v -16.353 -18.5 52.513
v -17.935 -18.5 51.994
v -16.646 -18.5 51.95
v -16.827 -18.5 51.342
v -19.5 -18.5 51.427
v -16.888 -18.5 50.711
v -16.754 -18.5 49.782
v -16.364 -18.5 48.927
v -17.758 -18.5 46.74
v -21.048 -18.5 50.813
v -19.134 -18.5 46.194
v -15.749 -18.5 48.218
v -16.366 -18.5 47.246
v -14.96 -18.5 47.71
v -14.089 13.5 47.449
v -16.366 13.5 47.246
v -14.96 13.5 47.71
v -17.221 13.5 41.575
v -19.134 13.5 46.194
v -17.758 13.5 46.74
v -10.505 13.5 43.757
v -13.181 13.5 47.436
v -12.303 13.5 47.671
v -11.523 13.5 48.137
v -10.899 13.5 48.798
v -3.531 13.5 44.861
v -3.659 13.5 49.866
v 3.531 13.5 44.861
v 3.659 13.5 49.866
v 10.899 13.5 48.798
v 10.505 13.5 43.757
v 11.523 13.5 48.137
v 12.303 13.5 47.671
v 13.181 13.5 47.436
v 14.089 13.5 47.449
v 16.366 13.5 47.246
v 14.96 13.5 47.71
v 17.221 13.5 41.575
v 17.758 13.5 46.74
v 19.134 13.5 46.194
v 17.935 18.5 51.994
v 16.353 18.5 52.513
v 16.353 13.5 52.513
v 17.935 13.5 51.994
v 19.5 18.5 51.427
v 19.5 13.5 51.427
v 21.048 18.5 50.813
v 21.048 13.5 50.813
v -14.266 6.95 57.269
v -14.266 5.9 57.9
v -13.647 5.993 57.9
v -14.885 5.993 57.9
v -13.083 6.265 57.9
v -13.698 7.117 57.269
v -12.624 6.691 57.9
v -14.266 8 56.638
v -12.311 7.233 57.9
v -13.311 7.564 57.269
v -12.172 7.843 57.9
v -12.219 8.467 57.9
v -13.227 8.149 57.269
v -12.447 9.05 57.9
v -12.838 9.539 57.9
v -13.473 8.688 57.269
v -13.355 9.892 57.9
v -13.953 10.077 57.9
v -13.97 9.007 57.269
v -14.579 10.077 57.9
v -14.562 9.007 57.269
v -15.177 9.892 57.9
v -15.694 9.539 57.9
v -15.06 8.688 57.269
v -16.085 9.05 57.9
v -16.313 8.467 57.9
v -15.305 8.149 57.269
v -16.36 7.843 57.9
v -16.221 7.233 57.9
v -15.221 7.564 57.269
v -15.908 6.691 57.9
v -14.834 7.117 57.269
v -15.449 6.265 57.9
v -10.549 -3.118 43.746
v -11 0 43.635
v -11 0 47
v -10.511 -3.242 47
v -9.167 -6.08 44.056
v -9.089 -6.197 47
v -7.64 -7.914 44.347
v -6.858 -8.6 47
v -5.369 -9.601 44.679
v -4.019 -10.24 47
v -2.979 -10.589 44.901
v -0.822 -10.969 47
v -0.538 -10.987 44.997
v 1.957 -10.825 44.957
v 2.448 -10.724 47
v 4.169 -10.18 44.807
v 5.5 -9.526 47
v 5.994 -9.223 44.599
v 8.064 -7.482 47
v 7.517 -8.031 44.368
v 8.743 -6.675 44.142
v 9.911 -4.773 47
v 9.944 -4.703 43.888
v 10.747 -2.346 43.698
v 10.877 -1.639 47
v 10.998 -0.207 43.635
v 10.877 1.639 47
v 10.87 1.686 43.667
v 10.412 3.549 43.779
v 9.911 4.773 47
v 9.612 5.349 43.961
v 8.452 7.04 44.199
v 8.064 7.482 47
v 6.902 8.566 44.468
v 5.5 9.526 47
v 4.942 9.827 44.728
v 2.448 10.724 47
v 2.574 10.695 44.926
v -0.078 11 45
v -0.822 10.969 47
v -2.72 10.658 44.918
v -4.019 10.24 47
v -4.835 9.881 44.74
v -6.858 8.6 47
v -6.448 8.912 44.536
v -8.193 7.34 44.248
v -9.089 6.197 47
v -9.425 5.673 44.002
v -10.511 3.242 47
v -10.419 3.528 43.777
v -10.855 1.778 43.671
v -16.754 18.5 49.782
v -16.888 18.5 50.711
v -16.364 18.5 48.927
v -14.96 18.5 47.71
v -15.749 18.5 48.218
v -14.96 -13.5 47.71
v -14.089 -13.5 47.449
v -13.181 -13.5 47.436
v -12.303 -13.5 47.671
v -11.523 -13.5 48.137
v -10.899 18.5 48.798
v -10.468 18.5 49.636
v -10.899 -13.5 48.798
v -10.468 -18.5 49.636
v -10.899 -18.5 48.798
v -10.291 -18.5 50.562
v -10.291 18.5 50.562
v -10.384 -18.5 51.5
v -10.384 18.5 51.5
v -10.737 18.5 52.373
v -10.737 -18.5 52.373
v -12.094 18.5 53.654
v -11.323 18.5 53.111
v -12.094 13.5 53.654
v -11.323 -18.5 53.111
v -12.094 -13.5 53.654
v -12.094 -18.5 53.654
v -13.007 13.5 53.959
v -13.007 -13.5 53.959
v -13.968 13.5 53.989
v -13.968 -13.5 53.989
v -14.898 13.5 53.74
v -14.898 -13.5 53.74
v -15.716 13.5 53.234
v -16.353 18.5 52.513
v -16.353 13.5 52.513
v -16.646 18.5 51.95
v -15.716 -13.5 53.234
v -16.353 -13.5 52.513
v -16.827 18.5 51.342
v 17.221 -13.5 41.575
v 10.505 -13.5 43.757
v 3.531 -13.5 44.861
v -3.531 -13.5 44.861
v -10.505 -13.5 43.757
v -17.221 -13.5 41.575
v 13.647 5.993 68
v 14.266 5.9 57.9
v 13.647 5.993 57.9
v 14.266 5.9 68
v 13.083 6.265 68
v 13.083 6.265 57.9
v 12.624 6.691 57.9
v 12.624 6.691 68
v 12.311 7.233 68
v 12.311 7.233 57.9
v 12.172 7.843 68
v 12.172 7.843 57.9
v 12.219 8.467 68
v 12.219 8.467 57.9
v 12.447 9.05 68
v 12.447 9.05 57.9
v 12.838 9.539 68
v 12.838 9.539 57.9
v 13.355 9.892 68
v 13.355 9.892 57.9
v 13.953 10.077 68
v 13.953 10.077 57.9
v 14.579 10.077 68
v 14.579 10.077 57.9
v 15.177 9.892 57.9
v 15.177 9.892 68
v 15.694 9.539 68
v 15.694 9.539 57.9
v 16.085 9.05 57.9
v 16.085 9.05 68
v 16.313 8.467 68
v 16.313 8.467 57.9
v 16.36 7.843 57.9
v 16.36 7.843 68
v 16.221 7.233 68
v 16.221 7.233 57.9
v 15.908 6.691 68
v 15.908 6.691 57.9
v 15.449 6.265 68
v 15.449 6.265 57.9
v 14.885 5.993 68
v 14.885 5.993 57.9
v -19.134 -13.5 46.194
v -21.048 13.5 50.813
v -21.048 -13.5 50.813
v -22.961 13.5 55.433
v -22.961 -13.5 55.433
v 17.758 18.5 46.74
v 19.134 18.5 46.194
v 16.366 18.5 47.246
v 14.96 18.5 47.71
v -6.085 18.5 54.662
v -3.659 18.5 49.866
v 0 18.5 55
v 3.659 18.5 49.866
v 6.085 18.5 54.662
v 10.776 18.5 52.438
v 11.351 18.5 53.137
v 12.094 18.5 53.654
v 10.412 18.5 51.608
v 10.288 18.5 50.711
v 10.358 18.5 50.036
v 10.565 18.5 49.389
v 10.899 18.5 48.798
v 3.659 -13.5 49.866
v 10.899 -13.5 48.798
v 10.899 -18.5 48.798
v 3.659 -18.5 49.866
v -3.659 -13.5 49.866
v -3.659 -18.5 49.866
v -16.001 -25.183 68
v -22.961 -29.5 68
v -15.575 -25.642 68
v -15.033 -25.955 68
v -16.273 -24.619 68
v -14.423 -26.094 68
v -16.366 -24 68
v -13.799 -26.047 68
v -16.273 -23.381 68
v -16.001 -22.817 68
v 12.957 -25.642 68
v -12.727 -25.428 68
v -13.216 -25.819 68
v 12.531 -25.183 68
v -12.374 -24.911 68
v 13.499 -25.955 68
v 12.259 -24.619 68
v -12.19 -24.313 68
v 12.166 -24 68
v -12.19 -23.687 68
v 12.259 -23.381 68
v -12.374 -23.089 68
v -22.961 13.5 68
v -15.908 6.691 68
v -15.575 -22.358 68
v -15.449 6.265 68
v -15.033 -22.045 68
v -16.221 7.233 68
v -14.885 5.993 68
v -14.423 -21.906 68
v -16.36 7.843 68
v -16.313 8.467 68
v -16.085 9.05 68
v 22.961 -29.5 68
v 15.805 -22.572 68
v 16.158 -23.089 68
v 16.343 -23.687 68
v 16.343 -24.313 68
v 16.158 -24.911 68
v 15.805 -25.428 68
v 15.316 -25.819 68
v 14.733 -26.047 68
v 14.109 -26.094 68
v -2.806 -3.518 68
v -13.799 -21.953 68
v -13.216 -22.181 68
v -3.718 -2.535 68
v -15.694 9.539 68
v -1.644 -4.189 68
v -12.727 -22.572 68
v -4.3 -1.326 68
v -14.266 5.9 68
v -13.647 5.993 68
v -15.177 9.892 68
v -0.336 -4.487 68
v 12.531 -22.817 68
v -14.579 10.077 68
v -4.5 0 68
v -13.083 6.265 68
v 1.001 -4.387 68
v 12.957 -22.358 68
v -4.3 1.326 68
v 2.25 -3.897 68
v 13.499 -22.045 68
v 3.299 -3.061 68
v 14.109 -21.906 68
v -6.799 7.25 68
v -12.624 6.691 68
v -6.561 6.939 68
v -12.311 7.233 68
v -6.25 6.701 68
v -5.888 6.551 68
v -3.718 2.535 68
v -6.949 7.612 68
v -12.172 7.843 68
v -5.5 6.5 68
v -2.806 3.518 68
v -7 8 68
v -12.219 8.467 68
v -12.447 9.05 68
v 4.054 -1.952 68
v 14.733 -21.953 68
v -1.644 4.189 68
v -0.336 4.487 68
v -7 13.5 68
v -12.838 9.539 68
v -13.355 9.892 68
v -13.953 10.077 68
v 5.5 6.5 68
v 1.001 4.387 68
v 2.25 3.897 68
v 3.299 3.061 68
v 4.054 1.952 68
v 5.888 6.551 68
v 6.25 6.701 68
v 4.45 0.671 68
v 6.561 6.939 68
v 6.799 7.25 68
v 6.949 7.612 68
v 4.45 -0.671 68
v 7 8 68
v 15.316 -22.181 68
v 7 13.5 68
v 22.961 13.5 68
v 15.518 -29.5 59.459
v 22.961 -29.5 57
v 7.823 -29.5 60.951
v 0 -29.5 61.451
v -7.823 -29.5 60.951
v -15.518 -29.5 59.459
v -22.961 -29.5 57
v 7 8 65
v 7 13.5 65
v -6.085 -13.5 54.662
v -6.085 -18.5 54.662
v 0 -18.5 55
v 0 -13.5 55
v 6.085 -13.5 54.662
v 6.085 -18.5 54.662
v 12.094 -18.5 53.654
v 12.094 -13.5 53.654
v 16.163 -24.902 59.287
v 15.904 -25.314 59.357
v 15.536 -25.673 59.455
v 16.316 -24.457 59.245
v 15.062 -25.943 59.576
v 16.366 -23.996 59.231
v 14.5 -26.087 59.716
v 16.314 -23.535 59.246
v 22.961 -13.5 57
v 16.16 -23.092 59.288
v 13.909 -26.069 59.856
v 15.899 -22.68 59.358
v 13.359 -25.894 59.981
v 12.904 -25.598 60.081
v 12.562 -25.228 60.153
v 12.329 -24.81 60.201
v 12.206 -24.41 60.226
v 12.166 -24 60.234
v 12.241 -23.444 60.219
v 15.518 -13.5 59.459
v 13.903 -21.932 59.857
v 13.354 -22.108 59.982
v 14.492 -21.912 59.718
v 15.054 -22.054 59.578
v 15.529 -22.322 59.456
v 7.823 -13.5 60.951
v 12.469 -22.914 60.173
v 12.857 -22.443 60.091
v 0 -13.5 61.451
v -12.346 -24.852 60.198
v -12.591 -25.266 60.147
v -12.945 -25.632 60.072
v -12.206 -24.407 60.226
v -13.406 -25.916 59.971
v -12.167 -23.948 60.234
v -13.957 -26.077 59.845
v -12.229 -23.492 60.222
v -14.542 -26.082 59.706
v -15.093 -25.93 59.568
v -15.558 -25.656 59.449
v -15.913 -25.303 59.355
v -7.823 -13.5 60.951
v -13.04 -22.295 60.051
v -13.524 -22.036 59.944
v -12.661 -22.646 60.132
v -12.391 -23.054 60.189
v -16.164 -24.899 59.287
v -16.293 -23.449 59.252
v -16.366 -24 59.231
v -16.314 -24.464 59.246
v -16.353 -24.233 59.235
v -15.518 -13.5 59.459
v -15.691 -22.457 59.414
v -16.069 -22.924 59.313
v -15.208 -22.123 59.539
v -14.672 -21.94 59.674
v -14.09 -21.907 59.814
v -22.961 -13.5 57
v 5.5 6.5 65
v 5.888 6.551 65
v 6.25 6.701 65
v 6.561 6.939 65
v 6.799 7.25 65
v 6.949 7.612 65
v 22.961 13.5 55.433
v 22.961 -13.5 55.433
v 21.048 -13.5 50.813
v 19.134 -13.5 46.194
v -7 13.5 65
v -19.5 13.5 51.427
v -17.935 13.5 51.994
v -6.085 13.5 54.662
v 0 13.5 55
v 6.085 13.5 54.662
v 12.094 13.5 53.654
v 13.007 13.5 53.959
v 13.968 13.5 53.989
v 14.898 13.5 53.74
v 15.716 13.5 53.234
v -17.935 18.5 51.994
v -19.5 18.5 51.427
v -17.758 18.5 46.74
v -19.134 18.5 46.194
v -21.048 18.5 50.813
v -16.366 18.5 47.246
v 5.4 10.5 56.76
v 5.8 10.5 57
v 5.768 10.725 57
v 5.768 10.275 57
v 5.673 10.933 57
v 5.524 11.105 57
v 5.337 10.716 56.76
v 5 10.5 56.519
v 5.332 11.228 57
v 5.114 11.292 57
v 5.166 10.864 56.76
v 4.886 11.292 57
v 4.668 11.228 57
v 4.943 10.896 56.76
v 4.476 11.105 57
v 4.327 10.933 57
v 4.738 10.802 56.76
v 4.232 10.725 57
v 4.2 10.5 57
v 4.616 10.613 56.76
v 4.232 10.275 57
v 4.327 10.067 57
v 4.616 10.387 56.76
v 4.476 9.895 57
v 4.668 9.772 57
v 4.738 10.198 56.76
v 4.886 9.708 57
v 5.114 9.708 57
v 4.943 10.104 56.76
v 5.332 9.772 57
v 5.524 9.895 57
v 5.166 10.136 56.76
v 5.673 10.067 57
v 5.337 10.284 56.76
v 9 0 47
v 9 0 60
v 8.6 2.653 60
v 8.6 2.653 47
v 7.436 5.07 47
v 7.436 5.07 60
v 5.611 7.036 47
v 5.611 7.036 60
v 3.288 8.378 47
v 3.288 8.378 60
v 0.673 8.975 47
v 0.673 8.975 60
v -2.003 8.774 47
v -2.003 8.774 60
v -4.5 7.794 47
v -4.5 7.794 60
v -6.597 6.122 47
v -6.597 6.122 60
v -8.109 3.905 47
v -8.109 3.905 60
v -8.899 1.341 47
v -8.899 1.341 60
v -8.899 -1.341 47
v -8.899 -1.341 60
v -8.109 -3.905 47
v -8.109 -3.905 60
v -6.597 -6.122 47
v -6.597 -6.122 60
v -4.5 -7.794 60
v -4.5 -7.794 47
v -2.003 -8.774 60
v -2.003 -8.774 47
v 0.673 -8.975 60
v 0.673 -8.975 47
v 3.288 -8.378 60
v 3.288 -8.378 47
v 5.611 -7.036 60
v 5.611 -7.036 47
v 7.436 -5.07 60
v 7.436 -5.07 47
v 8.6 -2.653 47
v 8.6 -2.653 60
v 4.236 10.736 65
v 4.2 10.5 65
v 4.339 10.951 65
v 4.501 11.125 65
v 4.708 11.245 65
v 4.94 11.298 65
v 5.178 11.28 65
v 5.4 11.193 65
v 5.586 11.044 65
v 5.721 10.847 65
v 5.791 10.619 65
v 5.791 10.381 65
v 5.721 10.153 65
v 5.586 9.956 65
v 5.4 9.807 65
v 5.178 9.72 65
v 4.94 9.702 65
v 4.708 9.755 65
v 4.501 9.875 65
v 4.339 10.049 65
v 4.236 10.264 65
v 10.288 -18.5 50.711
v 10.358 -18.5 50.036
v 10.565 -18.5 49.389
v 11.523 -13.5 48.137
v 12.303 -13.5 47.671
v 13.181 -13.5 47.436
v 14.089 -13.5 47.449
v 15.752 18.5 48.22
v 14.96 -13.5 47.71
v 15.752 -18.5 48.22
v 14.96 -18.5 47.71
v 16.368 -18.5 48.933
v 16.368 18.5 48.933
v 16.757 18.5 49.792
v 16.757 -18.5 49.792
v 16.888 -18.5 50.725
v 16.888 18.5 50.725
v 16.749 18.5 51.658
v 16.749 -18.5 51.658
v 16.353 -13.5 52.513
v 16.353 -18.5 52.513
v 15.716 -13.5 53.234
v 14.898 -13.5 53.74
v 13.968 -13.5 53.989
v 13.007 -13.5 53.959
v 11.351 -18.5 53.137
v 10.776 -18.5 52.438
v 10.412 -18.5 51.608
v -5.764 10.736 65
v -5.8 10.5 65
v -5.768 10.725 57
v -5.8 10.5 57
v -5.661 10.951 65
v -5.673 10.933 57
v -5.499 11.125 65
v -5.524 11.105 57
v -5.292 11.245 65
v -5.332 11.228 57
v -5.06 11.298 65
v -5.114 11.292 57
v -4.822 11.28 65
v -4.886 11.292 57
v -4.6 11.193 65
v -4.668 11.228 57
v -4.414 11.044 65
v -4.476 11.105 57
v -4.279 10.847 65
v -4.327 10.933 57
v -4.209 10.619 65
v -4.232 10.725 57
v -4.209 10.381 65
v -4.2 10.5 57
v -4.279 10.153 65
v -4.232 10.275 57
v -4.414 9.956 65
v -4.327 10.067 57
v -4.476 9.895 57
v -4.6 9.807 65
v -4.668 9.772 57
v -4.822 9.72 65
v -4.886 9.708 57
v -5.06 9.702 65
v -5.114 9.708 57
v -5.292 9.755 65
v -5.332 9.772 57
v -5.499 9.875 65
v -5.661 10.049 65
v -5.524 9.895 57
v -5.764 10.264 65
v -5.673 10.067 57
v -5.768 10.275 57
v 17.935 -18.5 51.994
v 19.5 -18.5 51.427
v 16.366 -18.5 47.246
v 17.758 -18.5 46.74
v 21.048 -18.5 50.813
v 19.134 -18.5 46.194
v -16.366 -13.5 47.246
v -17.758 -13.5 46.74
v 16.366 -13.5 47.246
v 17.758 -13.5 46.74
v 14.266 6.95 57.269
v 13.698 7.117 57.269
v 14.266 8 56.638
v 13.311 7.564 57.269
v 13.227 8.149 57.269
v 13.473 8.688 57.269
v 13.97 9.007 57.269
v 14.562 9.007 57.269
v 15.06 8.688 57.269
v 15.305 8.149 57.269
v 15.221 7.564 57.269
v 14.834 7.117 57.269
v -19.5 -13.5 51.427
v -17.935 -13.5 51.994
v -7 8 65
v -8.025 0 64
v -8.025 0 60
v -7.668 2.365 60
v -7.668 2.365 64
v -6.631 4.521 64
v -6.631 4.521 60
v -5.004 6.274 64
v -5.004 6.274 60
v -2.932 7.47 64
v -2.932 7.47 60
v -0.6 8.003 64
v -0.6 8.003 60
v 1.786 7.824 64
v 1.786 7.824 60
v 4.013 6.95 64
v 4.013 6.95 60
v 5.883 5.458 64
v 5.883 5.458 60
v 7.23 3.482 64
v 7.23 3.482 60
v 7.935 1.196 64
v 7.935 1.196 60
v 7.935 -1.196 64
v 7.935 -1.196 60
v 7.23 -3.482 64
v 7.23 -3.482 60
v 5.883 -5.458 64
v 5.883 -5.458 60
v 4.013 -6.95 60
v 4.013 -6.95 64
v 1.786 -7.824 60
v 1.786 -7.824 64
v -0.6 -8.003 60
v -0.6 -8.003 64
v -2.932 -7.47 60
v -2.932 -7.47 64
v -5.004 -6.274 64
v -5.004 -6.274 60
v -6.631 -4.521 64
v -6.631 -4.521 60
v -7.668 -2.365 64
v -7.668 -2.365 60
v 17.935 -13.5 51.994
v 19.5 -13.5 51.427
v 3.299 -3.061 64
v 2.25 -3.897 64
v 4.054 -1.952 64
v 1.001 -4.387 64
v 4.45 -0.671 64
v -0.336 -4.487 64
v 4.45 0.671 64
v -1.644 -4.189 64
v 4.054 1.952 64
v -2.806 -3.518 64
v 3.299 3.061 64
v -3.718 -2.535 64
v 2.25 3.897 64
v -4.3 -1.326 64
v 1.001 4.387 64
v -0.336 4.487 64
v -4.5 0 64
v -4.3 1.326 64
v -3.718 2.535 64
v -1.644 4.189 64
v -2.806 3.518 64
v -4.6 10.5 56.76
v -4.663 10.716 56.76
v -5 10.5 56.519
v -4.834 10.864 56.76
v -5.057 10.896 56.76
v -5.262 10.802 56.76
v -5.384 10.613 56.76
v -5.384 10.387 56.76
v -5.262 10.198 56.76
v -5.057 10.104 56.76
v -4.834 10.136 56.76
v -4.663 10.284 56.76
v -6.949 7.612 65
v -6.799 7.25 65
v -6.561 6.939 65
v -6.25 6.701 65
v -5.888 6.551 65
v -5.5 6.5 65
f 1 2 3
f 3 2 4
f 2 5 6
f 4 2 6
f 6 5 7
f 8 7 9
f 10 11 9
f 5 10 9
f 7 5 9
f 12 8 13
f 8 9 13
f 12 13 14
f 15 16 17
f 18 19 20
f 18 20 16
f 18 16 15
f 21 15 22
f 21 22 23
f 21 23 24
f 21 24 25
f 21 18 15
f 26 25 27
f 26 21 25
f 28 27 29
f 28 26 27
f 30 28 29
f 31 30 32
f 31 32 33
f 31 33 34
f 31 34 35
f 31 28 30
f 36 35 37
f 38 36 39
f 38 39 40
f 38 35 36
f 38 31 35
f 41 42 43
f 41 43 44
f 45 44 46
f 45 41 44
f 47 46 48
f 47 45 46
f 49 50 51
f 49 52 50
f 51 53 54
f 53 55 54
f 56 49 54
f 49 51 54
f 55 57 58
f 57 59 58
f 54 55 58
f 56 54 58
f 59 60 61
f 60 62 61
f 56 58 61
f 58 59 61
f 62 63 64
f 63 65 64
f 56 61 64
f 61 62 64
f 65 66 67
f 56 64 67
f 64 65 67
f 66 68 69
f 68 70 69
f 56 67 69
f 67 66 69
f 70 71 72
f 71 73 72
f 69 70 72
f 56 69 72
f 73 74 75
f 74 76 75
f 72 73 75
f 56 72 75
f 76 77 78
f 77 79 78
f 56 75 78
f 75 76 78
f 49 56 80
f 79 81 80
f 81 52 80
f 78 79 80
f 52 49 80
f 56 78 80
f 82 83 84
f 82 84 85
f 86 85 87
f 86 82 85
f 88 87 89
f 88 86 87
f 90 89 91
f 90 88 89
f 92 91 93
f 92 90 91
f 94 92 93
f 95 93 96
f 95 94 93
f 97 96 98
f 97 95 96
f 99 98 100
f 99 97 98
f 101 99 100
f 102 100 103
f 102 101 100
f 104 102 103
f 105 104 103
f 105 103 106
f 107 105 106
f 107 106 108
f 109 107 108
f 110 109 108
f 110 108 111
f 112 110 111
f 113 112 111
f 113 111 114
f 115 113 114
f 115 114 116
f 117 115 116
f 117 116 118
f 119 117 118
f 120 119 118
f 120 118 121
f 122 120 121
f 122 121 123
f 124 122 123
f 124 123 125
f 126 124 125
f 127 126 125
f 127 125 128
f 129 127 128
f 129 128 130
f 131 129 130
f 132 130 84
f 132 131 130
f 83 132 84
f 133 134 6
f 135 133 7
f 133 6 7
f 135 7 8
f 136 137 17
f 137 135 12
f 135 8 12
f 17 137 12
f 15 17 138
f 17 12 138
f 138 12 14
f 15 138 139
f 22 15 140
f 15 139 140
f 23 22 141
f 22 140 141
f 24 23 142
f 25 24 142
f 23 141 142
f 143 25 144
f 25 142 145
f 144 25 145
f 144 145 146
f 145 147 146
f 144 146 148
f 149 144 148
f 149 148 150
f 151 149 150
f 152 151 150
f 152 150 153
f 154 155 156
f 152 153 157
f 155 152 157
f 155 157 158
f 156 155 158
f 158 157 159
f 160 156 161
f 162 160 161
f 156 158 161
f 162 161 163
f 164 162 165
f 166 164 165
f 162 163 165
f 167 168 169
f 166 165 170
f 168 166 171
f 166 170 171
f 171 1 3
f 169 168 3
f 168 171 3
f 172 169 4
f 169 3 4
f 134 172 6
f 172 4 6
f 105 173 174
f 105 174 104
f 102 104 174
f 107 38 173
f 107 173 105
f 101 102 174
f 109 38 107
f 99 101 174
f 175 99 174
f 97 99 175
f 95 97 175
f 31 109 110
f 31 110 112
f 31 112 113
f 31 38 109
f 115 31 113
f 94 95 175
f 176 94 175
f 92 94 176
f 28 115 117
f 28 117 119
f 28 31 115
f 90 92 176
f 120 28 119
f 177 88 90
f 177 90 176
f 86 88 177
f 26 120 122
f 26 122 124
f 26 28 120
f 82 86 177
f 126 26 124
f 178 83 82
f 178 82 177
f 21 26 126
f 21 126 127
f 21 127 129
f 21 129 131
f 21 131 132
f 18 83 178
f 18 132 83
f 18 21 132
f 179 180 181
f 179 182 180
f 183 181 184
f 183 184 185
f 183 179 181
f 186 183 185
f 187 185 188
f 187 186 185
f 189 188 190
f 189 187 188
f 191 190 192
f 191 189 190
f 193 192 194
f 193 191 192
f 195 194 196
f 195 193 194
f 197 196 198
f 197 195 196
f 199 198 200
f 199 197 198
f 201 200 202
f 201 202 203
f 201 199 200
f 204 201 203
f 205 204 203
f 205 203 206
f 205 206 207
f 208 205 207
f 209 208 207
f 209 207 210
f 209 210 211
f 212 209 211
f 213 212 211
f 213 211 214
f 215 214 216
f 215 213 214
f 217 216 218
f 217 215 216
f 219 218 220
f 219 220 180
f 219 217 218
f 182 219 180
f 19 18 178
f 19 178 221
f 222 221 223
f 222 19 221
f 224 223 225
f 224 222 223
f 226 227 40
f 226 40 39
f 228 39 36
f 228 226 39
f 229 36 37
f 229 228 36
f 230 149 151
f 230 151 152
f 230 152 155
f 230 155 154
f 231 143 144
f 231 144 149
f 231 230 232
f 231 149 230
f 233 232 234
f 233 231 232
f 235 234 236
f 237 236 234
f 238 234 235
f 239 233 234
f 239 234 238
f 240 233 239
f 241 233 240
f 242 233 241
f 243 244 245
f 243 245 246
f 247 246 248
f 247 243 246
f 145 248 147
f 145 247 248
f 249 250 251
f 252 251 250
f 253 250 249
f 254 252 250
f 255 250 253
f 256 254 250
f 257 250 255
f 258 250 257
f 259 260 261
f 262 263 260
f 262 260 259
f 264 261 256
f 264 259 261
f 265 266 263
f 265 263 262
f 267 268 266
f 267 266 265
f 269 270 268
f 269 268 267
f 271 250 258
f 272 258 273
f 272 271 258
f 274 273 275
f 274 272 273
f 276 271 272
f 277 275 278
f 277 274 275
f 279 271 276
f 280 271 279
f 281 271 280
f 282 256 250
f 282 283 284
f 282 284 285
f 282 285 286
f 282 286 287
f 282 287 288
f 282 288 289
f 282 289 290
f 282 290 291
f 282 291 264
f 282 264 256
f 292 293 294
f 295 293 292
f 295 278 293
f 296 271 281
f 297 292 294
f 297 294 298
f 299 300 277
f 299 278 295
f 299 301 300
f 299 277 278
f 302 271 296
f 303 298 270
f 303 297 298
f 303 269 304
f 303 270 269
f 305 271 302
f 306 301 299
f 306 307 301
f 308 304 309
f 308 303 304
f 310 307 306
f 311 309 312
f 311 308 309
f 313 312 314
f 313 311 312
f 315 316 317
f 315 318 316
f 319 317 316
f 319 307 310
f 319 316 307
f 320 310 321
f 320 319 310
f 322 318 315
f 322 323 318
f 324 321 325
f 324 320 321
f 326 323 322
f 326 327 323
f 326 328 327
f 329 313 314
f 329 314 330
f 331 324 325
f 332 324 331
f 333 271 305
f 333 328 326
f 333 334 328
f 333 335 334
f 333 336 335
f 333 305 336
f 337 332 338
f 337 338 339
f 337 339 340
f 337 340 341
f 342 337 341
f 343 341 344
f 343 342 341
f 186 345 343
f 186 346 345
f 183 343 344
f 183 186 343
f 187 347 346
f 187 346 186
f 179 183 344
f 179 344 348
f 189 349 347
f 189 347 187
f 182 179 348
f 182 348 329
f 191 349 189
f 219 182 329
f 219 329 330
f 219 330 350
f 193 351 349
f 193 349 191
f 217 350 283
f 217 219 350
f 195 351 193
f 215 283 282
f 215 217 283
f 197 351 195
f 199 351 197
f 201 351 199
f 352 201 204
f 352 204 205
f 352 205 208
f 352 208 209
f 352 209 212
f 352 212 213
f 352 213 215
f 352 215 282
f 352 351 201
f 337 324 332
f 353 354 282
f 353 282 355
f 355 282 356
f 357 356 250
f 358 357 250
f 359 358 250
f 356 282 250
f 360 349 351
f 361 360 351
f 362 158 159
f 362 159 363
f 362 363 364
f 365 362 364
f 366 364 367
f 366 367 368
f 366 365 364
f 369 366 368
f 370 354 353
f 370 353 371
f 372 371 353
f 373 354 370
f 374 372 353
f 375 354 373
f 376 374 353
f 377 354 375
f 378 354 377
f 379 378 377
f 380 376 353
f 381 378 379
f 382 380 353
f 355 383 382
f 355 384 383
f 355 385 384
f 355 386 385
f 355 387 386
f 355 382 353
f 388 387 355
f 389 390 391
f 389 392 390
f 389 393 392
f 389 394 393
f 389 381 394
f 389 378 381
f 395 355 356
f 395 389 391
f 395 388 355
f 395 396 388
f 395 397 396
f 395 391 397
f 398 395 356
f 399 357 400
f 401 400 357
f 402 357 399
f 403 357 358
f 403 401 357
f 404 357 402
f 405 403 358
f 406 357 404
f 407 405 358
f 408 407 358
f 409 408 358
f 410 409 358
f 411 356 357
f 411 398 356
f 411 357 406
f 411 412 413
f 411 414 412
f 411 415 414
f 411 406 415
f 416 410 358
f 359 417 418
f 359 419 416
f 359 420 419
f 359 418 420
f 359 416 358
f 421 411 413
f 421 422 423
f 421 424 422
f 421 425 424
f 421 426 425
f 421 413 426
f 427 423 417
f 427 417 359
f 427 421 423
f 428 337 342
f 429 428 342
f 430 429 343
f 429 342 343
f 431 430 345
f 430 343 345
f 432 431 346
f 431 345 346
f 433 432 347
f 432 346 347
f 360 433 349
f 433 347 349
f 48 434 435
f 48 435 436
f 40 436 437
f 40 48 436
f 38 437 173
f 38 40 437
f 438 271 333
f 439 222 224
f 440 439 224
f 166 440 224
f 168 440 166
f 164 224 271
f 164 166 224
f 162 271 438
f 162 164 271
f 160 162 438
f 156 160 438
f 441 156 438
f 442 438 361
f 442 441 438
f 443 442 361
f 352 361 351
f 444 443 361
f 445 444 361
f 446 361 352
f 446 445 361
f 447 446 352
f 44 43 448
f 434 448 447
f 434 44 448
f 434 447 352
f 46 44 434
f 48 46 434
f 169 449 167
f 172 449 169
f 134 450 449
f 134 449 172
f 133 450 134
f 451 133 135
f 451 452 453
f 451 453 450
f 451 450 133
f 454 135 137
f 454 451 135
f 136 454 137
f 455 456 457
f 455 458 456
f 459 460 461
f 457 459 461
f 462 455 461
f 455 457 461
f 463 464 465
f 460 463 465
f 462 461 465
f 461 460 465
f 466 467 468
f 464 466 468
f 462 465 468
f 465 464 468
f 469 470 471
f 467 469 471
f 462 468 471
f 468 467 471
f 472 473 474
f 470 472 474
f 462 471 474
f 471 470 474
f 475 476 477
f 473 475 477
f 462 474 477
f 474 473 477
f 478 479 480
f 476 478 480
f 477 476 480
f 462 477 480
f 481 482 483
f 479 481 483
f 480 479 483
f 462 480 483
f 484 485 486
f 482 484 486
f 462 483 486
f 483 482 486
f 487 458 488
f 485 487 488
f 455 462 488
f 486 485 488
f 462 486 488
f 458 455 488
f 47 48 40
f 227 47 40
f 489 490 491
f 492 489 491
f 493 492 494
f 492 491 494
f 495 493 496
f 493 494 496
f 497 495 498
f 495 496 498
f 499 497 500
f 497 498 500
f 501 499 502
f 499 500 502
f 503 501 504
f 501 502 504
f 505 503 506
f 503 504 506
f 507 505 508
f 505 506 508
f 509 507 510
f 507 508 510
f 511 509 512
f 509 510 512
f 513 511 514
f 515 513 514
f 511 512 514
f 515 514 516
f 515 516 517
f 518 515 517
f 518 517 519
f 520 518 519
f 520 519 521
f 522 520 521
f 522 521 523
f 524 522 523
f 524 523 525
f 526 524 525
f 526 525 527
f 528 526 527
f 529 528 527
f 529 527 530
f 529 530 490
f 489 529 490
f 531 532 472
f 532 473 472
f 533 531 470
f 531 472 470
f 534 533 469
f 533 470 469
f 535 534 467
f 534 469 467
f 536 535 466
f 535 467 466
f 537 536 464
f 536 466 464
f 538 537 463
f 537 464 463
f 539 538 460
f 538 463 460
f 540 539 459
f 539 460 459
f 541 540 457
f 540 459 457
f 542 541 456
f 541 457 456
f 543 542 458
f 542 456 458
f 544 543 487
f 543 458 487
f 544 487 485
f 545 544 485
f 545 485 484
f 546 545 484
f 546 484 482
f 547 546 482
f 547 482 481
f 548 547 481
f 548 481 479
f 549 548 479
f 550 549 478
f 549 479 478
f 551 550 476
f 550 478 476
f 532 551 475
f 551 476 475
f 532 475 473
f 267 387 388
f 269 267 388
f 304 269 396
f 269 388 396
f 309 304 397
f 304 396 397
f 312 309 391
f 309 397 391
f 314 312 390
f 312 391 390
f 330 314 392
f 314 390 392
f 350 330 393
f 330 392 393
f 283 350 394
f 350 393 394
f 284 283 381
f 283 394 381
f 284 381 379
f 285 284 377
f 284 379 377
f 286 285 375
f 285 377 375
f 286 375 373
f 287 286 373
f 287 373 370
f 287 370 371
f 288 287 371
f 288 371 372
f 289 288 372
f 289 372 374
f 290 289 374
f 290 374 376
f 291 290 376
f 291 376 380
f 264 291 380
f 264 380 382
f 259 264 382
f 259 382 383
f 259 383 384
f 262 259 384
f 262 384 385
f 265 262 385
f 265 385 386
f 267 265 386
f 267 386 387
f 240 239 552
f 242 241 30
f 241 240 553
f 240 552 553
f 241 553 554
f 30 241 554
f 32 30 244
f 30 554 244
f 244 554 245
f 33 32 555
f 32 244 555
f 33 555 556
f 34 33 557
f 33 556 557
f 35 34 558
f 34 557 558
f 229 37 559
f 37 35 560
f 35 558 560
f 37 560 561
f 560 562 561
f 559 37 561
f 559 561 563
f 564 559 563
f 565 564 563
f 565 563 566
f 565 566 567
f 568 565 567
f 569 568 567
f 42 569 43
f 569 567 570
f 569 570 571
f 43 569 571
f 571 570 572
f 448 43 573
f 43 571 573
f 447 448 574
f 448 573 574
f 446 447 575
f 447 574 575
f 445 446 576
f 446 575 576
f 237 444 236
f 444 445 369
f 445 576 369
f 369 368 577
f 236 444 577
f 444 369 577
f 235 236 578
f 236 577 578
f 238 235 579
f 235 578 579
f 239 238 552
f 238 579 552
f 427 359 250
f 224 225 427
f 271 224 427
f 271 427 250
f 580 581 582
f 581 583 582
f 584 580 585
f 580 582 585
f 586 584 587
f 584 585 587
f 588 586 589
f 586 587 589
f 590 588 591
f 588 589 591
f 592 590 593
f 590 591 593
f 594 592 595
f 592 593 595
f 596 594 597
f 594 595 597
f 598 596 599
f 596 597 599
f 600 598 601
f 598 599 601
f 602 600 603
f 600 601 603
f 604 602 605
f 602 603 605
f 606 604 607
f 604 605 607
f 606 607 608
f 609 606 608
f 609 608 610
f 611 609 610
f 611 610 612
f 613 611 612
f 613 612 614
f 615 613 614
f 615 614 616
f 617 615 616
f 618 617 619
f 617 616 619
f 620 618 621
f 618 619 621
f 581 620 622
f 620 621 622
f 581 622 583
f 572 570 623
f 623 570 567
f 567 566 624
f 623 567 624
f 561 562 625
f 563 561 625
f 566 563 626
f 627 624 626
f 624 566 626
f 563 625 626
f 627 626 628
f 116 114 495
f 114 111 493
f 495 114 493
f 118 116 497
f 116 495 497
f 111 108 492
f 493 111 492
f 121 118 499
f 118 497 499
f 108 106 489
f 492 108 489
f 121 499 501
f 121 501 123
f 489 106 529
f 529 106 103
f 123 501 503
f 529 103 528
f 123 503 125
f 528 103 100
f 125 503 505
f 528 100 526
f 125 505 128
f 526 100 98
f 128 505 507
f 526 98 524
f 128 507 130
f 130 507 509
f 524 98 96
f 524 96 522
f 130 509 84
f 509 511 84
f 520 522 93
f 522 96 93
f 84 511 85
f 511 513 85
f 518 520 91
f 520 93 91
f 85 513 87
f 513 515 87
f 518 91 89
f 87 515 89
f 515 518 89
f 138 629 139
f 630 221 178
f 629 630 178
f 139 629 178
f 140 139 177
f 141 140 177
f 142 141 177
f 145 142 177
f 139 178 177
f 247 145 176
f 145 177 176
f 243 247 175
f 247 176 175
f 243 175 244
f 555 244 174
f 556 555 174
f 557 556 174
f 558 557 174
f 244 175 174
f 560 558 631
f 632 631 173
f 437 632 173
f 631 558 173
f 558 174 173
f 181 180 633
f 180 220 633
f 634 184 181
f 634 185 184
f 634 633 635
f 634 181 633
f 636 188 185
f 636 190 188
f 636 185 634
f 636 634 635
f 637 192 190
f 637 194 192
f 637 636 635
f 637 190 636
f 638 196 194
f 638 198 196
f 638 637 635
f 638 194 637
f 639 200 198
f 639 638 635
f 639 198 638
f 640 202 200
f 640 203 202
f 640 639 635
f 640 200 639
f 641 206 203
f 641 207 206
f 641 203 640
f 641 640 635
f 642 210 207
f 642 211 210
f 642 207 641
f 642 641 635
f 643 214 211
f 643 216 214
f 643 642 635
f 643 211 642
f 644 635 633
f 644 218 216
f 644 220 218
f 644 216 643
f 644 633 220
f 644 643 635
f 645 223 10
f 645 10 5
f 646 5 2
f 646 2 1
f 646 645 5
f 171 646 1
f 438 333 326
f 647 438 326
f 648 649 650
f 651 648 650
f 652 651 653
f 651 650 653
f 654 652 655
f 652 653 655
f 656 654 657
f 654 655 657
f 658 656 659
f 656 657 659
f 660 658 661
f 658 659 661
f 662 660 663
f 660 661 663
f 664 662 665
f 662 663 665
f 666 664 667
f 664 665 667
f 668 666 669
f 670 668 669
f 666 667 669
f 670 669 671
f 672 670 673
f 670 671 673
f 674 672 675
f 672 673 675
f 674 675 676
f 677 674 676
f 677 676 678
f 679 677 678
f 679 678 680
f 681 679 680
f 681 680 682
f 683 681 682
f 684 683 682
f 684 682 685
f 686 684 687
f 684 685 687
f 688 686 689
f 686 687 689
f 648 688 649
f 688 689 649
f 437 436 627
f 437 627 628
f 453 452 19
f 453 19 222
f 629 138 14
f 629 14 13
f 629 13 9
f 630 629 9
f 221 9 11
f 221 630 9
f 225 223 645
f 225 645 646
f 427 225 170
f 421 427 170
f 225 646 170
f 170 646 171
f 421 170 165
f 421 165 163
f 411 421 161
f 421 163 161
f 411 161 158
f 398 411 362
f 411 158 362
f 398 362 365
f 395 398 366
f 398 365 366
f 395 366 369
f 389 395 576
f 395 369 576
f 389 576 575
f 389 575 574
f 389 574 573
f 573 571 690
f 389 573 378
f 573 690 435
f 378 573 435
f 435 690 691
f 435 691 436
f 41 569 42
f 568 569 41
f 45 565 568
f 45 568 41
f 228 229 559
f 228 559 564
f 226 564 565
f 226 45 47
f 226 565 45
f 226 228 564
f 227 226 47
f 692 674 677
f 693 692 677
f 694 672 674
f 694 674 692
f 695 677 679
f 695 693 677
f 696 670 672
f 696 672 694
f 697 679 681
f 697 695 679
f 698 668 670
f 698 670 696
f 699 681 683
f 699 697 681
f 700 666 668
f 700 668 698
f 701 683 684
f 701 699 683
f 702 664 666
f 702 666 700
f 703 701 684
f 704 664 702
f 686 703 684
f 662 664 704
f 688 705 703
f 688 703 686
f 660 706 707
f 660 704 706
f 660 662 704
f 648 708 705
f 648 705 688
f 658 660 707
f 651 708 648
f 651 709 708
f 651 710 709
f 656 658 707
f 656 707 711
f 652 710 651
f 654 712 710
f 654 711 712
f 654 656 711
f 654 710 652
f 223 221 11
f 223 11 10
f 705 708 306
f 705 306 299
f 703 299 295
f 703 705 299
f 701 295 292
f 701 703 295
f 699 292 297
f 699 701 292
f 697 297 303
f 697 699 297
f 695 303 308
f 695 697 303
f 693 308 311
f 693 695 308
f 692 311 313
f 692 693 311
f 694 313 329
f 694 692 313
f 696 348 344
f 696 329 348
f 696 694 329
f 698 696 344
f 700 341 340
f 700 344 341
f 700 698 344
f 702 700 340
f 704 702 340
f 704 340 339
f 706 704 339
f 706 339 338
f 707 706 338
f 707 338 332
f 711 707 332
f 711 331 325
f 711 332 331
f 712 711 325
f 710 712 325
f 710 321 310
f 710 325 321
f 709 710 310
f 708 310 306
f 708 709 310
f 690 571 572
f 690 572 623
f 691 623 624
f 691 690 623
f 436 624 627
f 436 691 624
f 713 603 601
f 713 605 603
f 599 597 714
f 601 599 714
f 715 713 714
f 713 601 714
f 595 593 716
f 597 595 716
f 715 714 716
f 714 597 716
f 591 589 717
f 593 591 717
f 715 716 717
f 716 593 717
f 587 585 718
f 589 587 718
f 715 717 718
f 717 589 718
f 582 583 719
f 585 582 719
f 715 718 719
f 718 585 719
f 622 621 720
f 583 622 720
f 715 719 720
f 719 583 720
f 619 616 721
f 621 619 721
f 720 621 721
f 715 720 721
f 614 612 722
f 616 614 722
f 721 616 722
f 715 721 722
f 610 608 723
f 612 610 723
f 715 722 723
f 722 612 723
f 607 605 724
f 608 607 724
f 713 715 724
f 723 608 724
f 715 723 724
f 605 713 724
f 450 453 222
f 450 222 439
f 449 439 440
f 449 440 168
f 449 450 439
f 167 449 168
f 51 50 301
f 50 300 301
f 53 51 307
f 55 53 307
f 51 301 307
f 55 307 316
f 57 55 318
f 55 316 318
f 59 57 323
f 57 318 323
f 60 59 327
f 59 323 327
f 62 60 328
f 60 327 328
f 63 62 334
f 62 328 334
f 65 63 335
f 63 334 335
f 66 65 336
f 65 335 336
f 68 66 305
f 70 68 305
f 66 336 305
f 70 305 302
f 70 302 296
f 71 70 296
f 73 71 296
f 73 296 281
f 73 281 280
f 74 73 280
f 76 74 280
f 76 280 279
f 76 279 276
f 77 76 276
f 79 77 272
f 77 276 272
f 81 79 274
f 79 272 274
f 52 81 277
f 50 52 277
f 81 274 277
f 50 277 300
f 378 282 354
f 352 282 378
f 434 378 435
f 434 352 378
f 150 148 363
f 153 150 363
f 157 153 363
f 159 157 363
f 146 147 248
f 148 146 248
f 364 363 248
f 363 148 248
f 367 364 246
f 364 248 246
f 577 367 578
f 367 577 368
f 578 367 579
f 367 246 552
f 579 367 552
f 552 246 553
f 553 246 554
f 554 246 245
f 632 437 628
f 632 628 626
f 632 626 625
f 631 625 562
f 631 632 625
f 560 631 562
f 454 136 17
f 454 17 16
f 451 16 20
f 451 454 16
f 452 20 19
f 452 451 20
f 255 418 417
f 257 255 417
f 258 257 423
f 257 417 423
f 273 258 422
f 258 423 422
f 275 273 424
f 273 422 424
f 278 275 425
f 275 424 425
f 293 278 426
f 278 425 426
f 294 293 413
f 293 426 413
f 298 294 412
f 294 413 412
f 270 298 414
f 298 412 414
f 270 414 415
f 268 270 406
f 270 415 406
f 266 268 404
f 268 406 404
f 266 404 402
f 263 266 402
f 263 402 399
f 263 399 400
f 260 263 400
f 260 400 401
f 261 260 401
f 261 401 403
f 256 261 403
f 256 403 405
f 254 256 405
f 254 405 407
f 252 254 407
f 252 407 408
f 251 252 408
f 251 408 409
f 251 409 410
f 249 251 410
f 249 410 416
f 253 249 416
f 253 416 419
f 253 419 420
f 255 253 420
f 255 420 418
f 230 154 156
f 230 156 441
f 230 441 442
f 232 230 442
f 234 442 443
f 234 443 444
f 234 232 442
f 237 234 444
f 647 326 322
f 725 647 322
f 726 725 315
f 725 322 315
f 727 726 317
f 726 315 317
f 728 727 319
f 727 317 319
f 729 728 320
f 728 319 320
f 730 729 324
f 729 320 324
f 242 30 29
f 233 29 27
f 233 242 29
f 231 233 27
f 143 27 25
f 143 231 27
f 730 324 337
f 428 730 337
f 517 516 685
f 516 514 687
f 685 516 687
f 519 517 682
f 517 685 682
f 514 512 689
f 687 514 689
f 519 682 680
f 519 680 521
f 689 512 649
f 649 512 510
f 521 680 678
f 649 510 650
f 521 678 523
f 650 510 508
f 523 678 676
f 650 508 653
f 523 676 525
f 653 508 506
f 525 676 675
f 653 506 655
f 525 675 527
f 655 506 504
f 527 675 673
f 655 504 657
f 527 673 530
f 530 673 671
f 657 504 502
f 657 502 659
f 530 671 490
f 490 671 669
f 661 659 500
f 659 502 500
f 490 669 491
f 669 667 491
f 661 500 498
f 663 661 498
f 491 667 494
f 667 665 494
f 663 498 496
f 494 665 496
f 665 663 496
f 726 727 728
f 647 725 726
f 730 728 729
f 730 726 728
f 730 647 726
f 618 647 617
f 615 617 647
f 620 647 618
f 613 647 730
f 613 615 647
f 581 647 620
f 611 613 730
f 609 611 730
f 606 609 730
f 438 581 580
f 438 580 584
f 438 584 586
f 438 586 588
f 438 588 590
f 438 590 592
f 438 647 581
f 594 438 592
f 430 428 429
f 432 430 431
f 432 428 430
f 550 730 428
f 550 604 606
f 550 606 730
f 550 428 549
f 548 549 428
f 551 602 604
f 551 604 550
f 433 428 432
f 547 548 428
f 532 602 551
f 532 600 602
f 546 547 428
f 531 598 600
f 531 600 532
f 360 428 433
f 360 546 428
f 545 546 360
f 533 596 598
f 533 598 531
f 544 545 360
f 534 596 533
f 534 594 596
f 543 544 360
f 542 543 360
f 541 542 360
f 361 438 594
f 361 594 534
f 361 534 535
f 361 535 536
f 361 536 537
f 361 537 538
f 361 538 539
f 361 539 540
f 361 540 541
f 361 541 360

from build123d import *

# Parameters (mm, degrees)
BOSS_EXTRUDE1_DEPTH      = 13.5
BOSS_EXTRUDE2_DEPTH      = 18.5
BOSS_EXTRUDE3_DEPTH      = 5
SKETCH4_W                = 45.922011884
SKETCH4_H                = 20
BOSS_EXTRUDE4_DEPTH      = 13.5
SKETCH2_R                = 4
CUT_EXTRUDE1_DEPTH       = 268.629329099
SKETCH5_R                = 8
CUT_EXTRUDE2_DEPTH       = 4
SKETCH6_R                = 9
CUT_EXTRUDE3_DEPTH       = 12
SKETCH7_R                = 12.5
CUT_EXTRUDE4_DEPTH       = 5
BOSS_EXTRUDE5_DEPTH      = 13.5
CUT_EXTRUDE5_REACH       = 210.1
CUT_EXTRUDE5_END_RADIUS  = 45
SKETCH8_R                = 9
CUT_EXTRUDE6_REACH       = 210.1
SKETCH10_R               = 4.5
SKETCH18_R               = 11
CUT_EXTRUDE9_DEPTH       = 47
CUT_EXTRUDE10_DEPTH      = 268.629329099
CUT_EXTRUDE10_DEPTH_BACK = 268.629329099
SKETCH19_W               = 45.922011884
SKETCH19_H               = 198
M6_CLEARANCE_HOLE1_D     = 6.6
SKETCH30_R               = 8.025
CUT_EXTRUDE13_DEPTH      = 4
BOSS_EXTRUDE9_DEPTH      = 16
M5_TAPPED_HOLE2_D        = 4.2
CUT_EXTRUDE16_DEPTH      = 3
M2_TAPPED_HOLE1_D        = 1.6
M2_TAPPED_HOLE1_DEPTH    = 8
M2_TAPPED_HOLE1_TIP      = 0.480688495


with BuildPart() as part:
    # Sketch1 → Boss-Extrude1 (new, symmetric)
    with BuildSketch(Plane(origin=(0, 0, 0), x_dir=(1, 0, 0), z_dir=(0, 1, 0))):
        with BuildLine():
            ThreePointArc((17.220754456, -41.574578963), (0, -45), (-17.220754456, -41.574578963))
            Line((-17.220754456, -41.574578963), (-22.961005942, -55.432771951))
            ThreePointArc((-22.961005942, -55.432771951), (0, -60), (22.961005942, -55.432771951))
            Line((22.961005942, -55.432771951), (17.220754456, -41.574578963))
        make_face()
    extrude(amount=BOSS_EXTRUDE1_DEPTH, both=True)

    # Sketch1_3 → Boss-Extrude2 (add, symmetric)
    with BuildSketch(Plane(origin=(0, 0, 0), x_dir=(1, 0, 0), z_dir=(0, 1, 0))):
        with BuildLine():
            ThreePointArc((19.134171618, -46.193976626), (0, -50), (-19.134171618, -46.193976626))
            Line((-19.134171618, -46.193976626), (-21.04758878, -50.813374288))
            ThreePointArc((-21.04758878, -50.813374288), (0, -55), (21.04758878, -50.813374288))
            Line((21.04758878, -50.813374288), (19.134171618, -46.193976626))
        make_face()
    extrude(amount=BOSS_EXTRUDE2_DEPTH, both=True)

    # Sketch3 → Boss-Extrude3 (add, symmetric)
    with BuildSketch(Plane.XZ):
        with BuildLine():
            Line((-22.961005942, 266), (-22.961005942, 55.432771951))
            ThreePointArc((-22.961005942, 55.432771951), (-20.481139434, 56.39612511), (-17.961005942, 57.248600555))
            Line((-17.961005942, 57.248600555), (-17.961005942, 246))
            Line((-17.961005942, 246), (17.961005942, 246))
            Line((17.961005942, 246), (17.961005942, 57.248600555))
            ThreePointArc((17.961005942, 57.248600555), (20.481139434, 56.39612511), (22.961005942, 55.432771951))
            Line((22.961005942, 55.432771951), (22.961005942, 266))
            Line((22.961005942, 266), (-22.961005942, 266))
        make_face()
    extrude(amount=BOSS_EXTRUDE3_DEPTH, both=True)

    # Sketch4 → Boss-Extrude4 (add, symmetric)
    with BuildSketch(Plane(origin=(0, 0, 0), x_dir=(1, 0, 0), z_dir=(0, 1, 0))):
        with Locations((0, -256)):
            Rectangle(SKETCH4_W, SKETCH4_H)
    extrude(amount=BOSS_EXTRUDE4_DEPTH, both=True)

    # Sketch2 → Cut-Extrude1 (cut, through all)
    with BuildSketch(Plane.XY):
        with Locations(Location((0, 0, 0), (0, 0, 180))):
            Circle(SKETCH2_R)
    extrude(amount=CUT_EXTRUDE1_DEPTH, mode=Mode.SUBTRACT)

    # Sketch5 → Cut-Extrude2 (cut)
    with BuildSketch(Plane(origin=(0, 0, 246), x_dir=(-1, 0, 0), z_dir=(0, 0, -1))):
        Circle(SKETCH5_R)
    extrude(amount=-CUT_EXTRUDE2_DEPTH, mode=Mode.SUBTRACT)

    # Sketch6 → Cut-Extrude3 (cut)
    with BuildSketch(Plane.XY.offset(266)):
        Circle(SKETCH6_R)
    extrude(amount=-CUT_EXTRUDE3_DEPTH, mode=Mode.SUBTRACT)

    # Sketch7 → Cut-Extrude4 (cut)
    with BuildSketch(Plane.XY.offset(266)):
        Circle(SKETCH7_R)
    extrude(amount=-CUT_EXTRUDE4_DEPTH, mode=Mode.SUBTRACT)

    # Sketch9 → Boss-Extrude5 (add, symmetric)
    with BuildSketch(Plane(origin=(0, 0, 0), x_dir=(1, 0, 0), z_dir=(0, 1, 0))):
        with BuildLine():
            Line((-22.961005942, -55.432771951), (-22.961005942, -68))
            Line((-22.961005942, -68), (22.961005942, -68))
            Line((22.961005942, -68), (22.961005942, -55.432771951))
            ThreePointArc((22.961005942, -55.432771951), (0, -60), (-22.961005942, -55.432771951))
        make_face()
    extrude(amount=BOSS_EXTRUDE5_DEPTH, both=True)

    # Cut-Extrude5: up to this cylinder (the profile starts outside it)
    cut_extrude5_end = Plane(origin=(0, 0, 0), z_dir=(0, -1, 0)) * Cylinder(CUT_EXTRUDE5_END_RADIUS, 511.2, mode=Mode.PRIVATE)
    # Sketch8 → Cut-Extrude5 (cut, up to the surface)
    with BuildSketch(Plane.XY.offset(60), mode=Mode.PRIVATE) as cut_extrude5_sk1:
        Circle(SKETCH8_R)
    cut_extrude5_tool1 = extrude(cut_extrude5_sk1.sketch, amount=-CUT_EXTRUDE5_REACH, mode=Mode.PRIVATE) - cut_extrude5_end
    add(cut_extrude5_tool1.solids().sort_by_distance((0, 0, 60))[0], mode=Mode.SUBTRACT)

    # Sketch10 → Cut-Extrude6 (cut, up to next)
    with BuildSketch(Plane.XY.offset(60), mode=Mode.PRIVATE) as cut_extrude6_sk1:
        with Locations(Location((0, 0, 0), (0, 0, 180))):
            Circle(SKETCH10_R)
    cut_extrude6_tool1 = extrude(cut_extrude6_sk1.sketch, amount=CUT_EXTRUDE6_REACH, mode=Mode.PRIVATE) & part.part
    add(cut_extrude6_tool1.solids().sort_by_distance((0, 0, 60))[0], mode=Mode.SUBTRACT)

    # Sketch18 → Cut-Extrude9 (cut)
    with BuildSketch(Plane.XY):
        with Locations(Location((0, 0, 0), (0, 0, 180))):
            Circle(SKETCH18_R)
    extrude(amount=CUT_EXTRUDE9_DEPTH, mode=Mode.SUBTRACT)

    # Sketch19 → Cut-Extrude10 (cut, two sides: drawn at the far end of the back side and taken through both)
    with BuildSketch(Plane(origin=(0, 0, 0), x_dir=(1, 0, 0), z_dir=(0, 1, 0)).offset(-CUT_EXTRUDE10_DEPTH_BACK)):
        with Locations((0, -167)):
            Rectangle(SKETCH19_W, SKETCH19_H)
    extrude(amount=CUT_EXTRUDE10_DEPTH + CUT_EXTRUDE10_DEPTH_BACK, mode=Mode.SUBTRACT)

    # Sketch23 → M5 Tapped Hole1 (revolve, cut)
    with BuildSketch(Plane(origin=(14.26606865, 8, 68), x_dir=(0, -1, 0), z_dir=(1, 0, 0))):
        Polygon((0, 0), (0, 11.3618073), (2.1, 10.1), (2.1, 0), align=None)
    m5_tapped_hole1 = revolve(axis=Axis((14.26606865, 8, 74.35), (0, 0, -1)), mode=Mode.SUBTRACT)

    # Mirror1: M5 Tapped Hole1 across plane
    add(m5_tapped_hole1.mirror(Plane(origin=(0, 0, 0), x_dir=(0, 0, 1), z_dir=(1, 0, 0))), mode=Mode.SUBTRACT)

    # M6 Clearance Hole1 (through all)
    with Locations(Plane(origin=(0, 18.5, 0), x_dir=(1, 0, 0), z_dir=(0, 1, 0))):
        with Locations((-13.587999868, -50.71110588), (13.587999868, -50.71110588)):
            Hole(M6_CLEARANCE_HOLE1_D / 2)

    # Sketch30 → Cut-Extrude13 (cut)
    with BuildSketch(Plane(origin=(0, 0, 60), x_dir=(-1, 0, 0), z_dir=(0, 0, -1))):
        Circle(SKETCH30_R)
    extrude(amount=-CUT_EXTRUDE13_DEPTH, mode=Mode.SUBTRACT)

    # Sketch37 → Boss-Extrude9 (add)
    with BuildSketch(Plane.XZ.offset(13.5)):
        with BuildLine():
            Line((-22.961005942, 68), (22.961005942, 68))
            Line((22.961005942, 68), (22.961005942, 57))
            ThreePointArc((22.961005942, 57), (0, 61.450856738), (-22.961005942, 57))
            Line((-22.961005942, 57), (-22.961005942, 68))
        make_face()
    extrude(amount=BOSS_EXTRUDE9_DEPTH)

    # M5 Tapped Hole2 (through all)
    with Locations(Plane.XY.offset(68)):
        with Locations((-14.26606865, -24), (14.26606865, -24)):
            Hole(M5_TAPPED_HOLE2_D / 2)

    # Sketch41 → Cut-Extrude16 (cut)
    with BuildSketch(Plane.XY.offset(68)):
        with BuildLine():
            Line((-7, 13.5), (-7, 8))
            ThreePointArc((-7, 8), (-6.560660172, 6.939339828), (-5.5, 6.5))
            Line((-5.5, 6.5), (5.5, 6.5))
            ThreePointArc((5.5, 6.5), (6.560660172, 6.939339828), (7, 8))
            Line((7, 8), (7, 13.5))
            Line((7, 13.5), (-7, 13.5))
        make_face()
    extrude(amount=-CUT_EXTRUDE16_DEPTH, mode=Mode.SUBTRACT)

    # M2 Tapped Hole1
    with Locations(Plane.XY.offset(65)):
        with Locations((-5, 10.5), (5, 10.5)):
            Hole(M2_TAPPED_HOLE1_D / 2, depth=M2_TAPPED_HOLE1_DEPTH)
            with Locations((0, 0, -(M2_TAPPED_HOLE1_DEPTH + M2_TAPPED_HOLE1_TIP / 2))):  # 118° drill point
                Cone(0, M2_TAPPED_HOLE1_D / 2, M2_TAPPED_HOLE1_TIP, mode=Mode.SUBTRACT)


solid = part.part
